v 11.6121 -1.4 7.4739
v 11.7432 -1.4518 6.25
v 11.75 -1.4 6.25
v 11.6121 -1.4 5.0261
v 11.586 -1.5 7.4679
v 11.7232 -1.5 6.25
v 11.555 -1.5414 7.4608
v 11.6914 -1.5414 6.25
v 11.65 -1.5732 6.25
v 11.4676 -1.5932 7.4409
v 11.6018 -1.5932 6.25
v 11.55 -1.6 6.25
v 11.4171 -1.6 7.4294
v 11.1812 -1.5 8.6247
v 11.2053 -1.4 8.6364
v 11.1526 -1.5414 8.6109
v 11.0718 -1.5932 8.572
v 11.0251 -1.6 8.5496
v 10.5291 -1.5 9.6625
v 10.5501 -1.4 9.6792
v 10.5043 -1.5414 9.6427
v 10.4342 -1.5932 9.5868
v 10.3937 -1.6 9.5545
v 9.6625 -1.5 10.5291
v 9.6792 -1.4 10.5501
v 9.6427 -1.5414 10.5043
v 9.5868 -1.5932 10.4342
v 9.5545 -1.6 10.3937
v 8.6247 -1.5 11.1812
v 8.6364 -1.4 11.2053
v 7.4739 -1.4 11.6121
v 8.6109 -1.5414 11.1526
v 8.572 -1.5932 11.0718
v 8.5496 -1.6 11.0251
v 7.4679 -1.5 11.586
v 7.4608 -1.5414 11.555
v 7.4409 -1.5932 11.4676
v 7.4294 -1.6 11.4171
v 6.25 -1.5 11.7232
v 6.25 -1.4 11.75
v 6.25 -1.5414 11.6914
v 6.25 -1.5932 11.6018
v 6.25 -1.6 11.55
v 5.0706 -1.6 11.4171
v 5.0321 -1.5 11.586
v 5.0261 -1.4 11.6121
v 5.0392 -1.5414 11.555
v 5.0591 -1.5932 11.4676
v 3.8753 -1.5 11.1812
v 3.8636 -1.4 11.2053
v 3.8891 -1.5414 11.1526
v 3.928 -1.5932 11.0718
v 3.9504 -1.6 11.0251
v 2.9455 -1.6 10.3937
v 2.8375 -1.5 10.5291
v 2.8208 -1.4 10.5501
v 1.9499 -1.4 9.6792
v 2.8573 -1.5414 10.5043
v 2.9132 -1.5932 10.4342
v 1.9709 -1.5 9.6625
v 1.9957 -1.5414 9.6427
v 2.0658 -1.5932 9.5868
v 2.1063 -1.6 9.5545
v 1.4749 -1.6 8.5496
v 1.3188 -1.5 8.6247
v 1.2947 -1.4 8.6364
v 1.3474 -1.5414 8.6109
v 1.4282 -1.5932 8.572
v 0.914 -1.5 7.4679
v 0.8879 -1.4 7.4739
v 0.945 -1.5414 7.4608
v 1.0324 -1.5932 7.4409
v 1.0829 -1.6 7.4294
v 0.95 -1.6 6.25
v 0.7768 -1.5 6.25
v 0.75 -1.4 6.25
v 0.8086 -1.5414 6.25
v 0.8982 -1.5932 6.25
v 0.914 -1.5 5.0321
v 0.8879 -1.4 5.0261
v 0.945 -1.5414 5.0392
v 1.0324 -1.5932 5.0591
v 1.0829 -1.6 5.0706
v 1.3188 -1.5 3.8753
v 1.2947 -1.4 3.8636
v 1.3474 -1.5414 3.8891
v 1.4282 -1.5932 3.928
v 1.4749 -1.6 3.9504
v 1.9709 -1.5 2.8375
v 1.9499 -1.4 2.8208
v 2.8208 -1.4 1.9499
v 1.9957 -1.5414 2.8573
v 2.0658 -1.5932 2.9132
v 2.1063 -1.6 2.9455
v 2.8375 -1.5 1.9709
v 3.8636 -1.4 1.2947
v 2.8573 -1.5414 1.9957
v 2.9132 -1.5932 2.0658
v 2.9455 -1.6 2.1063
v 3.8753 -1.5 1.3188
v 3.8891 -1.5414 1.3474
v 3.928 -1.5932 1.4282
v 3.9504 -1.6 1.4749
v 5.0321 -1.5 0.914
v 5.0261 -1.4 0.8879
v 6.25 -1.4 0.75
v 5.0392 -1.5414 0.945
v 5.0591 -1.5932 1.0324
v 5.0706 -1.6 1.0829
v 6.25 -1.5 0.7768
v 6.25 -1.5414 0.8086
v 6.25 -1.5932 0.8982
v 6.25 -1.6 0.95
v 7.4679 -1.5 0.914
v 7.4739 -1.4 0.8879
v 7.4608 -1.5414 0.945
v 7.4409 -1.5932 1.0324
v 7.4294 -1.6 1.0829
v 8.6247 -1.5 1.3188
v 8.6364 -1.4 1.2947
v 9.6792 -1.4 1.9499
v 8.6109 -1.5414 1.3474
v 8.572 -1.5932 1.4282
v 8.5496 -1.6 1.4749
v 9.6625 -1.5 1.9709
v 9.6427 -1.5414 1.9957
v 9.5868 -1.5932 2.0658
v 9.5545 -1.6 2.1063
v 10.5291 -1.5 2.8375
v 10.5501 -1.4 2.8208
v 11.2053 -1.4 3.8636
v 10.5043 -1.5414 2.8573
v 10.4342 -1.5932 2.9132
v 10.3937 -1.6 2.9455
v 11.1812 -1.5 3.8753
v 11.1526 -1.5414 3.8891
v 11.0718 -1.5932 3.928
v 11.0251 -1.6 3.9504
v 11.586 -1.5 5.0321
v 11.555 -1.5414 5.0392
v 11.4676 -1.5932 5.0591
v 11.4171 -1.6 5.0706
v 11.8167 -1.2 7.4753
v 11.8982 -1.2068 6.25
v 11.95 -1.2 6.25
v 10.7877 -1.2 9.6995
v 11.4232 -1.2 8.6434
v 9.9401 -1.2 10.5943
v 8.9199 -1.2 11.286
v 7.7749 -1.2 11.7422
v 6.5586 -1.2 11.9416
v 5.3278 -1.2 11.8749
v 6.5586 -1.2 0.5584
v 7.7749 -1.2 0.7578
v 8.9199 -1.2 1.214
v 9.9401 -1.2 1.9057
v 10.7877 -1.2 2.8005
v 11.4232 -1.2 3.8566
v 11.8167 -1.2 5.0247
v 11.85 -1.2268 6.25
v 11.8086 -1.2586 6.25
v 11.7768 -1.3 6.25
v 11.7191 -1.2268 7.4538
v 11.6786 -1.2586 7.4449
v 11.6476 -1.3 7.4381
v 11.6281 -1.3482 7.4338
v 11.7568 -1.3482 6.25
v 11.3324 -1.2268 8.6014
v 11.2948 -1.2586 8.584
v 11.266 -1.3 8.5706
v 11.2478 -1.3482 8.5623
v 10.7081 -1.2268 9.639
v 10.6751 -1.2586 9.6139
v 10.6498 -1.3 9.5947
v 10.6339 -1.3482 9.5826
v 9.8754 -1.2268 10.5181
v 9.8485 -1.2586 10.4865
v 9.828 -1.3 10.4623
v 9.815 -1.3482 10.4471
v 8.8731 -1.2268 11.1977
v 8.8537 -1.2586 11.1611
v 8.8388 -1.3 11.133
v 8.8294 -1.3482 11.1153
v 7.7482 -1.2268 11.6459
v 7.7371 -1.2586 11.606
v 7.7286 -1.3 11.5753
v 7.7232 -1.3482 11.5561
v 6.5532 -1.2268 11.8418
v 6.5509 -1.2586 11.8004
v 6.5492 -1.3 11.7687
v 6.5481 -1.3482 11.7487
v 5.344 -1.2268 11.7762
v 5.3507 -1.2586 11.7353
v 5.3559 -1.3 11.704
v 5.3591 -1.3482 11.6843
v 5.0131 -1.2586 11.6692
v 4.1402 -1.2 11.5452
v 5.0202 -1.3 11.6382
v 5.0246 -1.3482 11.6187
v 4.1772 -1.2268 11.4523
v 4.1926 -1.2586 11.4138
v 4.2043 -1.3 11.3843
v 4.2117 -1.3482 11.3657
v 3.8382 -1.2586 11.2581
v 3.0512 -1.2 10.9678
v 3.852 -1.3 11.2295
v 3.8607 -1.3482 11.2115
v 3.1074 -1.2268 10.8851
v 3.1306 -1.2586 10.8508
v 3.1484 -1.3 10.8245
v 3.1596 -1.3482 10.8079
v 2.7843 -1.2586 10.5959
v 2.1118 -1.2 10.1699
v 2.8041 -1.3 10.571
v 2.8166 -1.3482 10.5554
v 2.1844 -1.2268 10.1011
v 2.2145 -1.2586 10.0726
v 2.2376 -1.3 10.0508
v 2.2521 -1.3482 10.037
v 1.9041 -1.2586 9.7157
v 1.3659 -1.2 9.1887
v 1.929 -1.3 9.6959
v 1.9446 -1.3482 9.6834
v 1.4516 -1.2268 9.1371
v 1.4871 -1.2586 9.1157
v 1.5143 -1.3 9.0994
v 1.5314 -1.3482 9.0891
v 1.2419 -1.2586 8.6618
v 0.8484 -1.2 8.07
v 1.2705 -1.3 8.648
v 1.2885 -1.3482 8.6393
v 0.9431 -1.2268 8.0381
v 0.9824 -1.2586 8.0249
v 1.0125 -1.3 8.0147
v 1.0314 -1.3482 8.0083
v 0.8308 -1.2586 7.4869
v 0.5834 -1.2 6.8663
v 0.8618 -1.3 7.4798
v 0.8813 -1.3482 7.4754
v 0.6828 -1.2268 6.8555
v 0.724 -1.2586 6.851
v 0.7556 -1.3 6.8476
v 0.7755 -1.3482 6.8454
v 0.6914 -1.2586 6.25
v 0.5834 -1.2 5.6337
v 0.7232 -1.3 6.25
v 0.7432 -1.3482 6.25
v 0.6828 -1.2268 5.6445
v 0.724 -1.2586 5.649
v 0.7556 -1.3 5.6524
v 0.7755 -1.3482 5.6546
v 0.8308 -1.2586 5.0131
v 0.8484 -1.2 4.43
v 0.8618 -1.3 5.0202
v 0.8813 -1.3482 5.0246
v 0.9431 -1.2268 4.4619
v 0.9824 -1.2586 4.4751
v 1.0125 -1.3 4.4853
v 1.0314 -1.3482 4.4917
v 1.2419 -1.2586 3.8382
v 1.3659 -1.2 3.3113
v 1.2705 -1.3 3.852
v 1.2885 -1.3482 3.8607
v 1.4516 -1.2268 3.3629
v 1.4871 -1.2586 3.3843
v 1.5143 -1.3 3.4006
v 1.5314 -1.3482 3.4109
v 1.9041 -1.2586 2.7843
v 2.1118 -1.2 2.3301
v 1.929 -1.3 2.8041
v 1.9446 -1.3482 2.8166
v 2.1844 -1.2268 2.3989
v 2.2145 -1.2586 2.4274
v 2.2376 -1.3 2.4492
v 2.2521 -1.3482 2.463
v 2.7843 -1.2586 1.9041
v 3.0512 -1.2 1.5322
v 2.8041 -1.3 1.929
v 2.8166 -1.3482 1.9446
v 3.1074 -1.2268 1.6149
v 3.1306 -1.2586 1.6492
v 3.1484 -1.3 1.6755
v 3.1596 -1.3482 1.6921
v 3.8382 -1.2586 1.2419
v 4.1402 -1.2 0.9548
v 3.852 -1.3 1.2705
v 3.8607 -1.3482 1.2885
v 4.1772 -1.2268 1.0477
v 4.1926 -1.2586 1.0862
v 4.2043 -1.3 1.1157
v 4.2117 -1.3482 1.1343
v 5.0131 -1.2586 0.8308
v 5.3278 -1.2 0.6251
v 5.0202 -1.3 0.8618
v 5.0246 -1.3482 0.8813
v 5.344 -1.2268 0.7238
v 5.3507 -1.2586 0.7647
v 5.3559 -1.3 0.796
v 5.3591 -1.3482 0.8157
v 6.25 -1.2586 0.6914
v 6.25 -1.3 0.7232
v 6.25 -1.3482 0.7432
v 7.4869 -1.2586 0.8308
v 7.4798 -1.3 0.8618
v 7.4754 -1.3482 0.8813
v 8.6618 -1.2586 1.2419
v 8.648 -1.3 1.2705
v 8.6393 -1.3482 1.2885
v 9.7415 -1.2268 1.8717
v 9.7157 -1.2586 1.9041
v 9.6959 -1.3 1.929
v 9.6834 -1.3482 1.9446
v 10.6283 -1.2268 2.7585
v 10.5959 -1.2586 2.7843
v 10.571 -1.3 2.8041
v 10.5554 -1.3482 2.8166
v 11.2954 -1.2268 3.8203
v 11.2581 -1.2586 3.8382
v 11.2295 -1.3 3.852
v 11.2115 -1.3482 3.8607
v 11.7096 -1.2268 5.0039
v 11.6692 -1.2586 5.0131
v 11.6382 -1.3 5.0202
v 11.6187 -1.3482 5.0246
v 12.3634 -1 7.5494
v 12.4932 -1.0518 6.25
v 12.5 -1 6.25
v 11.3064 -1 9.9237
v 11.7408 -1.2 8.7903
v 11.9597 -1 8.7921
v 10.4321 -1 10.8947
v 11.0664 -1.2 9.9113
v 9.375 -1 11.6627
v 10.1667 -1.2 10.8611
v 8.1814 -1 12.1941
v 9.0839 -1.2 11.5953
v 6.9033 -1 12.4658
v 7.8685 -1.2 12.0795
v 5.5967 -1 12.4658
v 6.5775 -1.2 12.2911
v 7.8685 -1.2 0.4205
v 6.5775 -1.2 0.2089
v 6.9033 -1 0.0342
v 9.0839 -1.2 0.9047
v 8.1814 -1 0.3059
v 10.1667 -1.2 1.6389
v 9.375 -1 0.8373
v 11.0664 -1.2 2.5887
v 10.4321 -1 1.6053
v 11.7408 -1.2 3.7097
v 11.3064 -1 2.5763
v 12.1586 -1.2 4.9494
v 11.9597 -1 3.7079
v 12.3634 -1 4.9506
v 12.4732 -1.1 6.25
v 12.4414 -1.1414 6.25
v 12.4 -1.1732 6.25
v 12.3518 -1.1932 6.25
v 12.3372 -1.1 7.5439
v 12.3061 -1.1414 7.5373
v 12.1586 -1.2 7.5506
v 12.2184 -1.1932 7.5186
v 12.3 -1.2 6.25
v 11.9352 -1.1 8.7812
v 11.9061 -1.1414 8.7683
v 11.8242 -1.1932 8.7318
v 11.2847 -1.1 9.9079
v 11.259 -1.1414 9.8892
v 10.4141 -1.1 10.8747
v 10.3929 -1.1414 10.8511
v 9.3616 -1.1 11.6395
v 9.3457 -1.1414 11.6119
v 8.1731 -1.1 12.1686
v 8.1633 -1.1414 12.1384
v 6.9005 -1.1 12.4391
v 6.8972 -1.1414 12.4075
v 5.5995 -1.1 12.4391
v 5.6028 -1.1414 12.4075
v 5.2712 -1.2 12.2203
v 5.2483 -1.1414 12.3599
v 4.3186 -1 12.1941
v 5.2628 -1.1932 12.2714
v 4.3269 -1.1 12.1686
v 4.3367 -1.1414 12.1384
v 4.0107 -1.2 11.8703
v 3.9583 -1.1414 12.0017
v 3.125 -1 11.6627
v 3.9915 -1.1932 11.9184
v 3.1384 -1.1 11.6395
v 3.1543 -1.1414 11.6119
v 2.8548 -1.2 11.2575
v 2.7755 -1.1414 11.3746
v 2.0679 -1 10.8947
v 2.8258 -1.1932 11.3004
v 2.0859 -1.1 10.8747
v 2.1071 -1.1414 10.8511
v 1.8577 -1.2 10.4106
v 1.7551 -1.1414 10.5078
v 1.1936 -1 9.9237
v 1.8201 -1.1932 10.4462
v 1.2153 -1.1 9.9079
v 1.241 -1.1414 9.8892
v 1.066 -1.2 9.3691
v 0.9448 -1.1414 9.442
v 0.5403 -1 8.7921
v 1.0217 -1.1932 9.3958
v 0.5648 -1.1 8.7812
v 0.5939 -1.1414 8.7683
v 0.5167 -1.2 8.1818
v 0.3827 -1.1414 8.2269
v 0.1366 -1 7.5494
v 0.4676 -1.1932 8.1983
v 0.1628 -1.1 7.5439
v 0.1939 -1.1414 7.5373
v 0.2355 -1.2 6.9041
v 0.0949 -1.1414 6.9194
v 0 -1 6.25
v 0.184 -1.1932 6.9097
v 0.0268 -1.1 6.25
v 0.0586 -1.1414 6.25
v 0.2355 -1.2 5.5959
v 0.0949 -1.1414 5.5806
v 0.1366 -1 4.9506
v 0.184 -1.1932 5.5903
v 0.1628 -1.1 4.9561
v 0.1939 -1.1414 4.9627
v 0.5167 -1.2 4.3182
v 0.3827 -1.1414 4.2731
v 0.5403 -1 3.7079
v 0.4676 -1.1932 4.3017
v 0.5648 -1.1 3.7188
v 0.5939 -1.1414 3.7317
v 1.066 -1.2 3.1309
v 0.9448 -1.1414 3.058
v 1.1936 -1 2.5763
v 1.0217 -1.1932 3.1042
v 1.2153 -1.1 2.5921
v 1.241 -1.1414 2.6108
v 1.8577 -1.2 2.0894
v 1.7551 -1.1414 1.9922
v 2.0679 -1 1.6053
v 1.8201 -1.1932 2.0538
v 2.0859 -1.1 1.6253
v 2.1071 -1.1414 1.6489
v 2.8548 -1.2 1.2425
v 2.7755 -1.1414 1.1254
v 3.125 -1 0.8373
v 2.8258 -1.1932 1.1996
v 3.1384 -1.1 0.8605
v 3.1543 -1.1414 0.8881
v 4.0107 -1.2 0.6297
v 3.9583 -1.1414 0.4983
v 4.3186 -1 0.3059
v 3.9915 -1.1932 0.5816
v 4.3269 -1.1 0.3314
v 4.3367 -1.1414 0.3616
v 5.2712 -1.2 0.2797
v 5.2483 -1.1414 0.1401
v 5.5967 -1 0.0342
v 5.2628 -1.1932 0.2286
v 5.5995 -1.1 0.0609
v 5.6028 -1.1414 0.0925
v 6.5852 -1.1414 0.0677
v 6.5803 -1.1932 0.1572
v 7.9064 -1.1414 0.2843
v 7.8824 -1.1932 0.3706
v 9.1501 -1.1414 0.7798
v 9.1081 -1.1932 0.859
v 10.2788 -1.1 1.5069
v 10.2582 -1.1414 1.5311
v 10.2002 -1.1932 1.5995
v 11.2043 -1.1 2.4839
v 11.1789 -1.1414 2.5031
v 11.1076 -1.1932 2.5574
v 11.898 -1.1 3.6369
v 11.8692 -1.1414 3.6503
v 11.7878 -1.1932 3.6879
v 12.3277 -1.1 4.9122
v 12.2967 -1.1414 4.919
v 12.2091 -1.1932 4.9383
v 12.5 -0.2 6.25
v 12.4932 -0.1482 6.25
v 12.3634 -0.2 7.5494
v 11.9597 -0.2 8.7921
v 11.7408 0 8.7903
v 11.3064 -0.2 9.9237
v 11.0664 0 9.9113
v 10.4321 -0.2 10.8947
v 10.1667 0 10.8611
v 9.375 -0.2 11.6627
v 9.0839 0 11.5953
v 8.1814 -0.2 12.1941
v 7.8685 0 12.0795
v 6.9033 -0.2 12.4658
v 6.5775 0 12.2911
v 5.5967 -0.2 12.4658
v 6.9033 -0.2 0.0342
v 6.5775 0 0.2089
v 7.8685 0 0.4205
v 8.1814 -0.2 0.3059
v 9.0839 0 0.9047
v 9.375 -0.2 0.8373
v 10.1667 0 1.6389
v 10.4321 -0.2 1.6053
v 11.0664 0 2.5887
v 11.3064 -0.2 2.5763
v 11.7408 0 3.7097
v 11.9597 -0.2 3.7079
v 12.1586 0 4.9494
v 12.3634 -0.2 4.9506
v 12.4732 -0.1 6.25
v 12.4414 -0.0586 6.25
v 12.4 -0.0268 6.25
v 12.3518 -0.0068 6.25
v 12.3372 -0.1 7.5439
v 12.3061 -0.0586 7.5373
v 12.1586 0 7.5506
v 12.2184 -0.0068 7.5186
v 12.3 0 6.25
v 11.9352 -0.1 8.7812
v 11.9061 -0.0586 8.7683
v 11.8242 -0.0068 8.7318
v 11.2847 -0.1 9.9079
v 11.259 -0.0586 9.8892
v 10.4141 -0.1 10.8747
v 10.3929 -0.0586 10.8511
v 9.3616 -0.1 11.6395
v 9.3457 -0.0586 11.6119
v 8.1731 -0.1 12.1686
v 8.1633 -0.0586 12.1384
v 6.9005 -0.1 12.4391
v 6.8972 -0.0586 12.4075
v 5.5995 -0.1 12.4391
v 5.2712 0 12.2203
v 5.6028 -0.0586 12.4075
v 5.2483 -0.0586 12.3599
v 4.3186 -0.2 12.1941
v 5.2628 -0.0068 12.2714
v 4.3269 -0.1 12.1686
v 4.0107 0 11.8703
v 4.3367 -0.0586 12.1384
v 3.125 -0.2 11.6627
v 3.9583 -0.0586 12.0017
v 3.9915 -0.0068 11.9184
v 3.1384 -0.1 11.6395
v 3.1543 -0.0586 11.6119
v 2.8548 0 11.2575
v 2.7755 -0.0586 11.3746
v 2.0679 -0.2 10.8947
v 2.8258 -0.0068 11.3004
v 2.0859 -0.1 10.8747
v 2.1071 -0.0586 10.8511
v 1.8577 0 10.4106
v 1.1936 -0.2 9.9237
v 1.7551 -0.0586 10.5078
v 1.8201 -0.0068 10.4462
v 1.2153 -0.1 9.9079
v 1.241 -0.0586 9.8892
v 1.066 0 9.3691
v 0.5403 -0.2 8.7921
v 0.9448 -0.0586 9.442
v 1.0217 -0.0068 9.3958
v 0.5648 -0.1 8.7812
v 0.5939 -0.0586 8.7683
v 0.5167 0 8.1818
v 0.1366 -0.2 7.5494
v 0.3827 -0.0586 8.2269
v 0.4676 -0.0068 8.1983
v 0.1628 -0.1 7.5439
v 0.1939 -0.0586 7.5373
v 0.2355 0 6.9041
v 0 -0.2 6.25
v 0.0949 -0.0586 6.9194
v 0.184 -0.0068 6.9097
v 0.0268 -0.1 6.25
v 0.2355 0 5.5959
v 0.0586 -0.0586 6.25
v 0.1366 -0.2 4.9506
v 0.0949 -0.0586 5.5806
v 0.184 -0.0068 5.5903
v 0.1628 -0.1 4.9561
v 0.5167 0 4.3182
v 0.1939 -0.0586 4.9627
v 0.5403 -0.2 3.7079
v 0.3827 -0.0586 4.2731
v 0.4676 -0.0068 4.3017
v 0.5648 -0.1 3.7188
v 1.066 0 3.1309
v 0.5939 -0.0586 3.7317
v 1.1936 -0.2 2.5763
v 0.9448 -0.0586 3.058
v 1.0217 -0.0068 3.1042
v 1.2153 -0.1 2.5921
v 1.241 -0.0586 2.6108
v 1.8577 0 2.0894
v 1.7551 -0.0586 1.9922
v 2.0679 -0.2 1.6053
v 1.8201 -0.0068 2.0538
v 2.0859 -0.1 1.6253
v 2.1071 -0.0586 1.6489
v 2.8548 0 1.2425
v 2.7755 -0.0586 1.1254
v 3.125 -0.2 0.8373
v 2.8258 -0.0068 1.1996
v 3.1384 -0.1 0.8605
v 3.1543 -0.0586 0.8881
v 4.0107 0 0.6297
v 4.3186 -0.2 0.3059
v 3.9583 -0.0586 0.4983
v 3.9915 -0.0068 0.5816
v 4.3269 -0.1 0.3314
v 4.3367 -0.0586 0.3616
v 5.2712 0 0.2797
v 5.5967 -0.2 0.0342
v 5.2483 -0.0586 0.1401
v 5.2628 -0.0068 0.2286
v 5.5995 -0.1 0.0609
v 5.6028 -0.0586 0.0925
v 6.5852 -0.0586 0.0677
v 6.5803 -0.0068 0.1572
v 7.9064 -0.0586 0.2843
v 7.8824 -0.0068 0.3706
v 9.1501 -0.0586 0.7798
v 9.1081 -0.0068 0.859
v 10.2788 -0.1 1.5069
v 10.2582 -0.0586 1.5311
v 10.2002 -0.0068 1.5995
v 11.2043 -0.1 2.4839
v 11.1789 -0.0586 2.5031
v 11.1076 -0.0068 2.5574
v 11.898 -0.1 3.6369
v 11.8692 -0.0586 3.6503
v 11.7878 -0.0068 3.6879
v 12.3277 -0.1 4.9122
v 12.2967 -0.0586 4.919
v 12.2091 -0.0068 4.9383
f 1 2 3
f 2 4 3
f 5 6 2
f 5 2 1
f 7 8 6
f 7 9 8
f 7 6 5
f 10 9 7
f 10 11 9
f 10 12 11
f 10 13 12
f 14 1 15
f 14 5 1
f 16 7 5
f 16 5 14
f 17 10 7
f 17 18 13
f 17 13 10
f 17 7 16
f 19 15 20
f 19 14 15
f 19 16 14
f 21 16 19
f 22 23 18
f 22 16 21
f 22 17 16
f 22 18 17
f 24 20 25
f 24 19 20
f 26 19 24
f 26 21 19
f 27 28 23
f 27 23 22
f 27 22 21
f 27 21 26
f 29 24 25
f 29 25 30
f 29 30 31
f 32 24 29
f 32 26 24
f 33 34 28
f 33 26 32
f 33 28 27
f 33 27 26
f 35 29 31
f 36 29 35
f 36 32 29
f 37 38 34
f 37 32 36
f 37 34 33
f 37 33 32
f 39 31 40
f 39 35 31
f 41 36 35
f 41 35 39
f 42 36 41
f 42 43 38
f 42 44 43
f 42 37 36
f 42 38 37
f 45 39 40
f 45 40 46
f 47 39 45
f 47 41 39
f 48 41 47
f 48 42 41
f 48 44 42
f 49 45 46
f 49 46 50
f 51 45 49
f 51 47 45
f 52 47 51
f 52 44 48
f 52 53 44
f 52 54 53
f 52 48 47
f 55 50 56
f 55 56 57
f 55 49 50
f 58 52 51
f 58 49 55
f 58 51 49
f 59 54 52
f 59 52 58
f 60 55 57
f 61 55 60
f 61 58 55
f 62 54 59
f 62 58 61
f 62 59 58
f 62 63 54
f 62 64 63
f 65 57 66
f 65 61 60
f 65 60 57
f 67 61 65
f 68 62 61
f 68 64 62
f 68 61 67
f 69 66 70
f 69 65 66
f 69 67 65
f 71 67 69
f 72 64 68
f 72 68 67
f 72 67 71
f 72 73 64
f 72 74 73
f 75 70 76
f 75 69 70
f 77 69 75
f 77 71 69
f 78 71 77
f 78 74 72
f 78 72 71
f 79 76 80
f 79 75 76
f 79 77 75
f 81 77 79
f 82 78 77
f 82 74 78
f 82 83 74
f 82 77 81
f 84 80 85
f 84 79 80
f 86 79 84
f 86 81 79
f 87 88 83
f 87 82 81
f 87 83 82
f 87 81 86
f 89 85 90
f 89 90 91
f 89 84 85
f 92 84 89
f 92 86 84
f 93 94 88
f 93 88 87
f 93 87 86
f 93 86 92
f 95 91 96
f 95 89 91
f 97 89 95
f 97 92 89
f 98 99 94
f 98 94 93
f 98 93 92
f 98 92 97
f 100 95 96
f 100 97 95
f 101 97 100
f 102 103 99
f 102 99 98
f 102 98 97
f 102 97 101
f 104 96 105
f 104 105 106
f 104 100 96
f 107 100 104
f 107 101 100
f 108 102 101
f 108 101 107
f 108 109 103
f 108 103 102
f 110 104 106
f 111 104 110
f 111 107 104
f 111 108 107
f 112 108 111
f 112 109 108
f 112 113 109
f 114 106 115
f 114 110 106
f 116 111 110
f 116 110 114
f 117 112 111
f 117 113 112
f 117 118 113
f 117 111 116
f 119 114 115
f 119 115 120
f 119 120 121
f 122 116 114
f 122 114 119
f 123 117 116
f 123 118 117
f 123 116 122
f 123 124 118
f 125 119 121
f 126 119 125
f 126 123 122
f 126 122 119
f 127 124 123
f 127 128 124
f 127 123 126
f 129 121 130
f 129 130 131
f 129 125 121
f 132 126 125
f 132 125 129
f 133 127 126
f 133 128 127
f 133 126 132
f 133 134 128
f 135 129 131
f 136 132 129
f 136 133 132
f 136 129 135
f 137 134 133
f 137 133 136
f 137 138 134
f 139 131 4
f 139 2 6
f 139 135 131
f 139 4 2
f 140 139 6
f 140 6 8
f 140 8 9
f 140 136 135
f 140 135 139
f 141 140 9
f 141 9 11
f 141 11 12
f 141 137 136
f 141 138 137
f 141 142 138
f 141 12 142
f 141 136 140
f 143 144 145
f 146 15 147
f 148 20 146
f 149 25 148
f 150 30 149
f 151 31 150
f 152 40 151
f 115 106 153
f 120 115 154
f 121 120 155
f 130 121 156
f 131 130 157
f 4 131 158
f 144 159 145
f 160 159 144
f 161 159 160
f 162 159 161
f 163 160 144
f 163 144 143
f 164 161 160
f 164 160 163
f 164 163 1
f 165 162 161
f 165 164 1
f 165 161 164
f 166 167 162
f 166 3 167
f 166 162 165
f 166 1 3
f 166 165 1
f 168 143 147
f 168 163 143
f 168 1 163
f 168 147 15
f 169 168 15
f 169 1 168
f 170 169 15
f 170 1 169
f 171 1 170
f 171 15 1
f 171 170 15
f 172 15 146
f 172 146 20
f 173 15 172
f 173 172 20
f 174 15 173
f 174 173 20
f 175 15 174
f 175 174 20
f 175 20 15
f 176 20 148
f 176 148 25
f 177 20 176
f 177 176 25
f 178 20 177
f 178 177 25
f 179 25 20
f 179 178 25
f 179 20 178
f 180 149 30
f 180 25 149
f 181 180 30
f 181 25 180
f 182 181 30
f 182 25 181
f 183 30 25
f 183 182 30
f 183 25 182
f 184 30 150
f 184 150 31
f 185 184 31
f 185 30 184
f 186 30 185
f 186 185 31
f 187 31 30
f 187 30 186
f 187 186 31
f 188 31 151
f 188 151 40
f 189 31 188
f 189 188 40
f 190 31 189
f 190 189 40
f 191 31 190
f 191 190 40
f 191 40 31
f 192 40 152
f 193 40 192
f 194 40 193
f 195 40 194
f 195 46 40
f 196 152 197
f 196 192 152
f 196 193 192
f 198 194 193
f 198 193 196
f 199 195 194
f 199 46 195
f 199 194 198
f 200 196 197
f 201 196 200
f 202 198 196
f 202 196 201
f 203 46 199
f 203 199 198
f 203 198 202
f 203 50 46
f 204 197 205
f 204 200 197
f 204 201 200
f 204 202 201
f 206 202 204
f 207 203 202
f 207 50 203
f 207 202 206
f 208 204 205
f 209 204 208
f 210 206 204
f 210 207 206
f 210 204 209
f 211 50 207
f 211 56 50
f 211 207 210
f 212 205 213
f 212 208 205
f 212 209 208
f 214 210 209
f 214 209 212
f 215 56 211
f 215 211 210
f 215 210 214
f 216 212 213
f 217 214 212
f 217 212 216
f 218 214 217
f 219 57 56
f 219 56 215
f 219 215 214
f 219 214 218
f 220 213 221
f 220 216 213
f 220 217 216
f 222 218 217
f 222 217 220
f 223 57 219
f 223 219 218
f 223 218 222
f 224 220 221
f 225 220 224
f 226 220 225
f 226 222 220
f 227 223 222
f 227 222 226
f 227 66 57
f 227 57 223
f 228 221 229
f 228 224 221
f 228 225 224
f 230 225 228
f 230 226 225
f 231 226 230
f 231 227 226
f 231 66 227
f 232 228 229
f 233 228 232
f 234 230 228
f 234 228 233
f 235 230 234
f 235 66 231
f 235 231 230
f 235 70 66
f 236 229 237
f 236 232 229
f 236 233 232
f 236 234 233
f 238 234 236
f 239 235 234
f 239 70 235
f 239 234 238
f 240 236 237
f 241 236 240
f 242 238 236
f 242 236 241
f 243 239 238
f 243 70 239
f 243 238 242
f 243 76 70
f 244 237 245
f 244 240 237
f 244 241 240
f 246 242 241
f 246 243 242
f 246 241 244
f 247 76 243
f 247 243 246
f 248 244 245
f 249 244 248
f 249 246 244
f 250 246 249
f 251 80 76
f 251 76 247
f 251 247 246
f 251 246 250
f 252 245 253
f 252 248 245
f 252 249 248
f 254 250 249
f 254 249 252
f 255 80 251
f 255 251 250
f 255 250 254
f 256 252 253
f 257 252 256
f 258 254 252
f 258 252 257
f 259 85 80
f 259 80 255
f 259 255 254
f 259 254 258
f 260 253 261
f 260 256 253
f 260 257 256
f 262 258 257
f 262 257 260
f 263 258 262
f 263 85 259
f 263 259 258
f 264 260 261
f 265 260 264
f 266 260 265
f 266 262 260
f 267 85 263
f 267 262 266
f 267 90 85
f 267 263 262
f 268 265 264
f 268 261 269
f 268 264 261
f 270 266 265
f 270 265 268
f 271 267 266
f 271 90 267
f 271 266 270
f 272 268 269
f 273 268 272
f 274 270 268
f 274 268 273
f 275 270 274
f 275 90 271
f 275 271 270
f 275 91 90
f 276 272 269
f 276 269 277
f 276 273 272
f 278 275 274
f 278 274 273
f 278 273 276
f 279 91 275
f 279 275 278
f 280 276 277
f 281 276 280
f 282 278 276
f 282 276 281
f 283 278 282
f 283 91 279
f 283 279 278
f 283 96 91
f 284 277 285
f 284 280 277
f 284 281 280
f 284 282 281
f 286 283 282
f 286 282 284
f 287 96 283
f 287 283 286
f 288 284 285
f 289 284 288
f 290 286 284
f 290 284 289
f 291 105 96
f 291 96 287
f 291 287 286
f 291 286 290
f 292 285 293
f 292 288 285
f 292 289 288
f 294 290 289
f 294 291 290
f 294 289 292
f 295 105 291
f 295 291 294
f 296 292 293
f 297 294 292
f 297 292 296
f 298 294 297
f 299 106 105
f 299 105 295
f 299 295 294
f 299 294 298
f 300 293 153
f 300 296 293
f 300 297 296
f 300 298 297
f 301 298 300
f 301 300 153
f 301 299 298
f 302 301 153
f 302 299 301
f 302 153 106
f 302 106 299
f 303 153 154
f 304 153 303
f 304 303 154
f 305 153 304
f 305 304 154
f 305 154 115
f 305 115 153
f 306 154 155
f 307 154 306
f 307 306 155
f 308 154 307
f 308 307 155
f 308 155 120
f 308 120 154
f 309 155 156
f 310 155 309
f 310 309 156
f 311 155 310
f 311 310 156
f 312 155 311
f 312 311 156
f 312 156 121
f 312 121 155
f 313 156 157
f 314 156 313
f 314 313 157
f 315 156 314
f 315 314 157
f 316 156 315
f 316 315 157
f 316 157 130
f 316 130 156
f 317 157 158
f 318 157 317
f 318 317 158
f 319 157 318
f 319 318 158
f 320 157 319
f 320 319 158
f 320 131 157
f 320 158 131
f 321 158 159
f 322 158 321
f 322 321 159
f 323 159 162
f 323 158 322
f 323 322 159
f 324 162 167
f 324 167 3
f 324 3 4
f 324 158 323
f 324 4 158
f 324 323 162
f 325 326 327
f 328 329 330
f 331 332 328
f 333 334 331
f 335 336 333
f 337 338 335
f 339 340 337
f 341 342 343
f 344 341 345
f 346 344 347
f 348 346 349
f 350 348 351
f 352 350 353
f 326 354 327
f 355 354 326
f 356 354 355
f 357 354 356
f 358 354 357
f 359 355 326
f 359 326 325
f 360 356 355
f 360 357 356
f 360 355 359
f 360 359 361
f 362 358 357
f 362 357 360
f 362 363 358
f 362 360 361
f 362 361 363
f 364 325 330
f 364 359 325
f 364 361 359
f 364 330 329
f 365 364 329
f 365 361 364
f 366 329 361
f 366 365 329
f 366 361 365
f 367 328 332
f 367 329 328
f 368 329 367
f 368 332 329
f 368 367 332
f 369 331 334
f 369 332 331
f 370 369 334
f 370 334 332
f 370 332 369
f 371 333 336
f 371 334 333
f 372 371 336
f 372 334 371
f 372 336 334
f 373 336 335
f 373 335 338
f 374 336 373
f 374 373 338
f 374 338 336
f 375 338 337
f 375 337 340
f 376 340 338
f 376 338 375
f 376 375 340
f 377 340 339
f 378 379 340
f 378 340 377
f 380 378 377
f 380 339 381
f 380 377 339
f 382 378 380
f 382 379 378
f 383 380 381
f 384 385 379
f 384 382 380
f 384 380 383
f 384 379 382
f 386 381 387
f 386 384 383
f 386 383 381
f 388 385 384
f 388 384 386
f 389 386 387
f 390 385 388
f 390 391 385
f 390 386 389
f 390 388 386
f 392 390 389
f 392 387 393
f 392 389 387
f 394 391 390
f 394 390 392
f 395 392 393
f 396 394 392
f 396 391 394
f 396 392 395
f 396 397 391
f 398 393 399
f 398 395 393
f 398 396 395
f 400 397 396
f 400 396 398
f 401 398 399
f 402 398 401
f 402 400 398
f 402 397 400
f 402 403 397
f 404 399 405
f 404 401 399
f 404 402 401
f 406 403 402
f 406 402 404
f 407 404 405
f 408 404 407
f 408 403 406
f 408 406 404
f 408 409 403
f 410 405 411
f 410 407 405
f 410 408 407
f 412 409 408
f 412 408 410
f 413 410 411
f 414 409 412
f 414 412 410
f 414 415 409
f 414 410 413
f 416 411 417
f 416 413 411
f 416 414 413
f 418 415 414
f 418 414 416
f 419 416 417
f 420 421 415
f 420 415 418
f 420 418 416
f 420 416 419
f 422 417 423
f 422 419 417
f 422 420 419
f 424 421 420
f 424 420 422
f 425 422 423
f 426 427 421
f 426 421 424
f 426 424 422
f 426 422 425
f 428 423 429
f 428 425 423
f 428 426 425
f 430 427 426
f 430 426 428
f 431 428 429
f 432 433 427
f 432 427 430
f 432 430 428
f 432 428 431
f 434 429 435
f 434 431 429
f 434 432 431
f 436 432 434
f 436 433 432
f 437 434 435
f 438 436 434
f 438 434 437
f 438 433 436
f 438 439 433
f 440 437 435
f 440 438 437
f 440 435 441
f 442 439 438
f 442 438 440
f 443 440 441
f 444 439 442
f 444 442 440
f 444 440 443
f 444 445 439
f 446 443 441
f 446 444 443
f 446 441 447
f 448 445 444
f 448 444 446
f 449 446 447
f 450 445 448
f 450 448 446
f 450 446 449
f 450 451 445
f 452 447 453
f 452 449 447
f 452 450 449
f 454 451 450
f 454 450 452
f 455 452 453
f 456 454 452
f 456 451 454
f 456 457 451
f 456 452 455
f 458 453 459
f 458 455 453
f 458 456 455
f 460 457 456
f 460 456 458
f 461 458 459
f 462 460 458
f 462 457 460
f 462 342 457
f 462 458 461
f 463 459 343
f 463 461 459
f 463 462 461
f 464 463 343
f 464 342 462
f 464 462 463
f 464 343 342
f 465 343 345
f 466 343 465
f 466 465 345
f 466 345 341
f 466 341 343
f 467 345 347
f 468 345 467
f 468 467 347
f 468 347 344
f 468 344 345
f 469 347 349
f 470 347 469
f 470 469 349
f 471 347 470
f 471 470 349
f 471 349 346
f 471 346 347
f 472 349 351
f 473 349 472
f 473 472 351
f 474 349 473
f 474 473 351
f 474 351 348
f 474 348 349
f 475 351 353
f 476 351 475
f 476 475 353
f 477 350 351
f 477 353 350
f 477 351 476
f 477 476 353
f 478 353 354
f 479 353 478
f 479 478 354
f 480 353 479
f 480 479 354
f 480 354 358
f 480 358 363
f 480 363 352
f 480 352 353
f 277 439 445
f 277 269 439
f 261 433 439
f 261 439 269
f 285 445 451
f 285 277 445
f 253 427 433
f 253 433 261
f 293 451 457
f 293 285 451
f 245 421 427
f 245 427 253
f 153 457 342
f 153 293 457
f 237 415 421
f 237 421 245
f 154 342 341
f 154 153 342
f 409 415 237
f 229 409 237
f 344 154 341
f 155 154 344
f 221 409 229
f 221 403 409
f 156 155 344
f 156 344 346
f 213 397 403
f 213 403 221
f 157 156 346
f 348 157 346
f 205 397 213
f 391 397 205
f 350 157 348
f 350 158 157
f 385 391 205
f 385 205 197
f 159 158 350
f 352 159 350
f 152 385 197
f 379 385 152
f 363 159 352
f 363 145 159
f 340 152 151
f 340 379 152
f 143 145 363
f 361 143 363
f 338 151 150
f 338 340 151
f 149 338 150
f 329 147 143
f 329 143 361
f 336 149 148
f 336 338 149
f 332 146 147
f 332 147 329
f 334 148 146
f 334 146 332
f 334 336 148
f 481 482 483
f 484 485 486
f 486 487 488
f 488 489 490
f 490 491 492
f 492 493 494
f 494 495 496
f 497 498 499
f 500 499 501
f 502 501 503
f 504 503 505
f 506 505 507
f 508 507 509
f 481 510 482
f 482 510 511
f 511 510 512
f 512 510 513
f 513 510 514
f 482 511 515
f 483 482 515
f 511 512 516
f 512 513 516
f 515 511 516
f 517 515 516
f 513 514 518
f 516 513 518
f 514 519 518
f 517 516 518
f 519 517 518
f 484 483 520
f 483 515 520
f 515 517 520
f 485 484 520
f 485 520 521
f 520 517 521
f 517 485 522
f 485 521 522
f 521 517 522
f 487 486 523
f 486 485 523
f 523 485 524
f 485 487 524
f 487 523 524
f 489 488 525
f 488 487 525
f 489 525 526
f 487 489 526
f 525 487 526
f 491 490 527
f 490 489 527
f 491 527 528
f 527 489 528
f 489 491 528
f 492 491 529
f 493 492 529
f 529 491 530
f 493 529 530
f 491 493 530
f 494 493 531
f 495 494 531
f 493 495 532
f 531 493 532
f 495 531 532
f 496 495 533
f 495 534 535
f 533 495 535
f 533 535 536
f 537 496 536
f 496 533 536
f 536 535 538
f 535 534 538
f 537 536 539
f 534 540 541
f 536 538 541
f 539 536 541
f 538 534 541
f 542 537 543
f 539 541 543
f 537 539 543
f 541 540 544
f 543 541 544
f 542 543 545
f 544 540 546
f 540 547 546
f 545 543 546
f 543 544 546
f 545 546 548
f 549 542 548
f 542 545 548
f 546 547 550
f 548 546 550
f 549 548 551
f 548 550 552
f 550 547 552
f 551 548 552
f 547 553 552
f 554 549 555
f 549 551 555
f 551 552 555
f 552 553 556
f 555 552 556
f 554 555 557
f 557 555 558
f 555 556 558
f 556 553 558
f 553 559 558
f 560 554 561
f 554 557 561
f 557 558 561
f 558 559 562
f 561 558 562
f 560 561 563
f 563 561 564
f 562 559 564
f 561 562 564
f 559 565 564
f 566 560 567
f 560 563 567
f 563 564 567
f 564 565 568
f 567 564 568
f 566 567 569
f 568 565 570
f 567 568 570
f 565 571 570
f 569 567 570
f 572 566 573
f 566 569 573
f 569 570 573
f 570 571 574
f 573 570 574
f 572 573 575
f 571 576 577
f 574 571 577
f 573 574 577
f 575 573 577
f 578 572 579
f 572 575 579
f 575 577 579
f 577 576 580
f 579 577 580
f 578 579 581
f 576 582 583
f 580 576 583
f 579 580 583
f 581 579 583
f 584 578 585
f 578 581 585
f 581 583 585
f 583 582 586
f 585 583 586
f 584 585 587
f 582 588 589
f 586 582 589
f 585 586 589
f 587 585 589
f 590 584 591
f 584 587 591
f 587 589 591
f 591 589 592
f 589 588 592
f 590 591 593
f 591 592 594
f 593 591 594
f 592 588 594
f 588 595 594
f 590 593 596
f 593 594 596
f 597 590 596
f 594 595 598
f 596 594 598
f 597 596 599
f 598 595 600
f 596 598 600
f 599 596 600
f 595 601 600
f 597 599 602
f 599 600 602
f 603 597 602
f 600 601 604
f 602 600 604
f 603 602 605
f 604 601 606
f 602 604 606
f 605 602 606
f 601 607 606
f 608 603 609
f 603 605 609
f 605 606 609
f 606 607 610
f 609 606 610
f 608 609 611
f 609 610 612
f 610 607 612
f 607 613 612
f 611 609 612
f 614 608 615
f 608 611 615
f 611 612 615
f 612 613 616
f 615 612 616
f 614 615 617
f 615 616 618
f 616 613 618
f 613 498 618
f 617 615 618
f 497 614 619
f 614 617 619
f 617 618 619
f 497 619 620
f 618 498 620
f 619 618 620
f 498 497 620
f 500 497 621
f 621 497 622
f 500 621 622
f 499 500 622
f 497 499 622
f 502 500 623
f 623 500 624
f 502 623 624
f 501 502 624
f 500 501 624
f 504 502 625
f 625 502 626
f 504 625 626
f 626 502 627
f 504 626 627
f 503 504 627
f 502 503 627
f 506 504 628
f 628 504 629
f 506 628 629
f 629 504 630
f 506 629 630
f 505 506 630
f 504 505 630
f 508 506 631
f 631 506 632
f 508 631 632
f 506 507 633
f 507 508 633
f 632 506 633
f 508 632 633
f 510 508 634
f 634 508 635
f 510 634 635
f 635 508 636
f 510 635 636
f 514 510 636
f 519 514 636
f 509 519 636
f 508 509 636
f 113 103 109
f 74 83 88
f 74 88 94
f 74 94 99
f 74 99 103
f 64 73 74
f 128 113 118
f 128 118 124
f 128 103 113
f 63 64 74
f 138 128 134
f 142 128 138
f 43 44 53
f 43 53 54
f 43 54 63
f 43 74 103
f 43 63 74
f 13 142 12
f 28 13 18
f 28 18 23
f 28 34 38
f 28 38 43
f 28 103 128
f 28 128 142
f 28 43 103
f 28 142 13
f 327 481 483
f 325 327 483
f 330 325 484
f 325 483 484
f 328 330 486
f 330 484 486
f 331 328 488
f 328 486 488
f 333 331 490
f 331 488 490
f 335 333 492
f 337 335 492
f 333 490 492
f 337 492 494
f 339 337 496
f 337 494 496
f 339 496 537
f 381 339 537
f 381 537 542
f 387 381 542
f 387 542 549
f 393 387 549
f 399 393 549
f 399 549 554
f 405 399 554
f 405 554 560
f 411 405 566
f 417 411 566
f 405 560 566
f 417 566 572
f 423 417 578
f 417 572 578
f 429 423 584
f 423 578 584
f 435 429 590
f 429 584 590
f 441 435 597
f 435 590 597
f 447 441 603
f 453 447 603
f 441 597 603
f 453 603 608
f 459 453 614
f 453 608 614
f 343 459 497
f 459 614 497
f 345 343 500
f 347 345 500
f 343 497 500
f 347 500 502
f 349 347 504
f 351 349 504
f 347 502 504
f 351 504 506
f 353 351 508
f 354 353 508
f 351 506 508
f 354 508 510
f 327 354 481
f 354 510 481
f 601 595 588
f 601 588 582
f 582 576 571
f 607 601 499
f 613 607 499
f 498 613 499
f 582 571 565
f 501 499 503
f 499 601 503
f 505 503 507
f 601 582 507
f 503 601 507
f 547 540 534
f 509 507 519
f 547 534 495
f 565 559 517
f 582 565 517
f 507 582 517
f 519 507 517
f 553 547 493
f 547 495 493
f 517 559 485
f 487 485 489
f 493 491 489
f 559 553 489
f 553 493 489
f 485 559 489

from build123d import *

# Parameters (mm, degrees)
F0_R     = 5.5
F1_DEPTH = 1.6
F0_R_2   = 6.25
F2_DEPTH = 1.2
F3_R     = 0.19999


# Not quite as in the source:
# - a fillet or chamfer is up to 0.001 mm smaller than in the source, because OpenCascade refuses the exact size


with BuildPart() as f1:
    # F0 (on Front) → F1 (new body)
    with BuildSketch(Plane.XZ):
        with Locations((6.25, 6.25)):
            Circle(F0_R)
    extrude(amount=F1_DEPTH)

    # F0 (on Front) → F2 (join)
    with BuildSketch(Plane.XZ):
        with Locations((6.25, 6.25)):
            Circle(F0_R_2)
        with Locations((6.25, 6.25)):
            Circle(F0_R, mode=Mode.SUBTRACT)
    extrude(amount=F2_DEPTH)

    # F3 (radius 0.2 in the source; OpenCascade refuses exactly that, so slightly less here)
    f3_edges = [f1.edges().sort_by_distance(p)[0] for p in [
        (0.75, -1.6, 6.25),
        (12.5, -0.6, 6.25),
        (0, 0, 6.25),
        (0, -1.2, 6.25),
        (0.75, -1.2, 6.25),
        (11.75, -1.4, 6.25),
    ]]
    fillet(f3_edges, radius=F3_R)


solid = f1.part
